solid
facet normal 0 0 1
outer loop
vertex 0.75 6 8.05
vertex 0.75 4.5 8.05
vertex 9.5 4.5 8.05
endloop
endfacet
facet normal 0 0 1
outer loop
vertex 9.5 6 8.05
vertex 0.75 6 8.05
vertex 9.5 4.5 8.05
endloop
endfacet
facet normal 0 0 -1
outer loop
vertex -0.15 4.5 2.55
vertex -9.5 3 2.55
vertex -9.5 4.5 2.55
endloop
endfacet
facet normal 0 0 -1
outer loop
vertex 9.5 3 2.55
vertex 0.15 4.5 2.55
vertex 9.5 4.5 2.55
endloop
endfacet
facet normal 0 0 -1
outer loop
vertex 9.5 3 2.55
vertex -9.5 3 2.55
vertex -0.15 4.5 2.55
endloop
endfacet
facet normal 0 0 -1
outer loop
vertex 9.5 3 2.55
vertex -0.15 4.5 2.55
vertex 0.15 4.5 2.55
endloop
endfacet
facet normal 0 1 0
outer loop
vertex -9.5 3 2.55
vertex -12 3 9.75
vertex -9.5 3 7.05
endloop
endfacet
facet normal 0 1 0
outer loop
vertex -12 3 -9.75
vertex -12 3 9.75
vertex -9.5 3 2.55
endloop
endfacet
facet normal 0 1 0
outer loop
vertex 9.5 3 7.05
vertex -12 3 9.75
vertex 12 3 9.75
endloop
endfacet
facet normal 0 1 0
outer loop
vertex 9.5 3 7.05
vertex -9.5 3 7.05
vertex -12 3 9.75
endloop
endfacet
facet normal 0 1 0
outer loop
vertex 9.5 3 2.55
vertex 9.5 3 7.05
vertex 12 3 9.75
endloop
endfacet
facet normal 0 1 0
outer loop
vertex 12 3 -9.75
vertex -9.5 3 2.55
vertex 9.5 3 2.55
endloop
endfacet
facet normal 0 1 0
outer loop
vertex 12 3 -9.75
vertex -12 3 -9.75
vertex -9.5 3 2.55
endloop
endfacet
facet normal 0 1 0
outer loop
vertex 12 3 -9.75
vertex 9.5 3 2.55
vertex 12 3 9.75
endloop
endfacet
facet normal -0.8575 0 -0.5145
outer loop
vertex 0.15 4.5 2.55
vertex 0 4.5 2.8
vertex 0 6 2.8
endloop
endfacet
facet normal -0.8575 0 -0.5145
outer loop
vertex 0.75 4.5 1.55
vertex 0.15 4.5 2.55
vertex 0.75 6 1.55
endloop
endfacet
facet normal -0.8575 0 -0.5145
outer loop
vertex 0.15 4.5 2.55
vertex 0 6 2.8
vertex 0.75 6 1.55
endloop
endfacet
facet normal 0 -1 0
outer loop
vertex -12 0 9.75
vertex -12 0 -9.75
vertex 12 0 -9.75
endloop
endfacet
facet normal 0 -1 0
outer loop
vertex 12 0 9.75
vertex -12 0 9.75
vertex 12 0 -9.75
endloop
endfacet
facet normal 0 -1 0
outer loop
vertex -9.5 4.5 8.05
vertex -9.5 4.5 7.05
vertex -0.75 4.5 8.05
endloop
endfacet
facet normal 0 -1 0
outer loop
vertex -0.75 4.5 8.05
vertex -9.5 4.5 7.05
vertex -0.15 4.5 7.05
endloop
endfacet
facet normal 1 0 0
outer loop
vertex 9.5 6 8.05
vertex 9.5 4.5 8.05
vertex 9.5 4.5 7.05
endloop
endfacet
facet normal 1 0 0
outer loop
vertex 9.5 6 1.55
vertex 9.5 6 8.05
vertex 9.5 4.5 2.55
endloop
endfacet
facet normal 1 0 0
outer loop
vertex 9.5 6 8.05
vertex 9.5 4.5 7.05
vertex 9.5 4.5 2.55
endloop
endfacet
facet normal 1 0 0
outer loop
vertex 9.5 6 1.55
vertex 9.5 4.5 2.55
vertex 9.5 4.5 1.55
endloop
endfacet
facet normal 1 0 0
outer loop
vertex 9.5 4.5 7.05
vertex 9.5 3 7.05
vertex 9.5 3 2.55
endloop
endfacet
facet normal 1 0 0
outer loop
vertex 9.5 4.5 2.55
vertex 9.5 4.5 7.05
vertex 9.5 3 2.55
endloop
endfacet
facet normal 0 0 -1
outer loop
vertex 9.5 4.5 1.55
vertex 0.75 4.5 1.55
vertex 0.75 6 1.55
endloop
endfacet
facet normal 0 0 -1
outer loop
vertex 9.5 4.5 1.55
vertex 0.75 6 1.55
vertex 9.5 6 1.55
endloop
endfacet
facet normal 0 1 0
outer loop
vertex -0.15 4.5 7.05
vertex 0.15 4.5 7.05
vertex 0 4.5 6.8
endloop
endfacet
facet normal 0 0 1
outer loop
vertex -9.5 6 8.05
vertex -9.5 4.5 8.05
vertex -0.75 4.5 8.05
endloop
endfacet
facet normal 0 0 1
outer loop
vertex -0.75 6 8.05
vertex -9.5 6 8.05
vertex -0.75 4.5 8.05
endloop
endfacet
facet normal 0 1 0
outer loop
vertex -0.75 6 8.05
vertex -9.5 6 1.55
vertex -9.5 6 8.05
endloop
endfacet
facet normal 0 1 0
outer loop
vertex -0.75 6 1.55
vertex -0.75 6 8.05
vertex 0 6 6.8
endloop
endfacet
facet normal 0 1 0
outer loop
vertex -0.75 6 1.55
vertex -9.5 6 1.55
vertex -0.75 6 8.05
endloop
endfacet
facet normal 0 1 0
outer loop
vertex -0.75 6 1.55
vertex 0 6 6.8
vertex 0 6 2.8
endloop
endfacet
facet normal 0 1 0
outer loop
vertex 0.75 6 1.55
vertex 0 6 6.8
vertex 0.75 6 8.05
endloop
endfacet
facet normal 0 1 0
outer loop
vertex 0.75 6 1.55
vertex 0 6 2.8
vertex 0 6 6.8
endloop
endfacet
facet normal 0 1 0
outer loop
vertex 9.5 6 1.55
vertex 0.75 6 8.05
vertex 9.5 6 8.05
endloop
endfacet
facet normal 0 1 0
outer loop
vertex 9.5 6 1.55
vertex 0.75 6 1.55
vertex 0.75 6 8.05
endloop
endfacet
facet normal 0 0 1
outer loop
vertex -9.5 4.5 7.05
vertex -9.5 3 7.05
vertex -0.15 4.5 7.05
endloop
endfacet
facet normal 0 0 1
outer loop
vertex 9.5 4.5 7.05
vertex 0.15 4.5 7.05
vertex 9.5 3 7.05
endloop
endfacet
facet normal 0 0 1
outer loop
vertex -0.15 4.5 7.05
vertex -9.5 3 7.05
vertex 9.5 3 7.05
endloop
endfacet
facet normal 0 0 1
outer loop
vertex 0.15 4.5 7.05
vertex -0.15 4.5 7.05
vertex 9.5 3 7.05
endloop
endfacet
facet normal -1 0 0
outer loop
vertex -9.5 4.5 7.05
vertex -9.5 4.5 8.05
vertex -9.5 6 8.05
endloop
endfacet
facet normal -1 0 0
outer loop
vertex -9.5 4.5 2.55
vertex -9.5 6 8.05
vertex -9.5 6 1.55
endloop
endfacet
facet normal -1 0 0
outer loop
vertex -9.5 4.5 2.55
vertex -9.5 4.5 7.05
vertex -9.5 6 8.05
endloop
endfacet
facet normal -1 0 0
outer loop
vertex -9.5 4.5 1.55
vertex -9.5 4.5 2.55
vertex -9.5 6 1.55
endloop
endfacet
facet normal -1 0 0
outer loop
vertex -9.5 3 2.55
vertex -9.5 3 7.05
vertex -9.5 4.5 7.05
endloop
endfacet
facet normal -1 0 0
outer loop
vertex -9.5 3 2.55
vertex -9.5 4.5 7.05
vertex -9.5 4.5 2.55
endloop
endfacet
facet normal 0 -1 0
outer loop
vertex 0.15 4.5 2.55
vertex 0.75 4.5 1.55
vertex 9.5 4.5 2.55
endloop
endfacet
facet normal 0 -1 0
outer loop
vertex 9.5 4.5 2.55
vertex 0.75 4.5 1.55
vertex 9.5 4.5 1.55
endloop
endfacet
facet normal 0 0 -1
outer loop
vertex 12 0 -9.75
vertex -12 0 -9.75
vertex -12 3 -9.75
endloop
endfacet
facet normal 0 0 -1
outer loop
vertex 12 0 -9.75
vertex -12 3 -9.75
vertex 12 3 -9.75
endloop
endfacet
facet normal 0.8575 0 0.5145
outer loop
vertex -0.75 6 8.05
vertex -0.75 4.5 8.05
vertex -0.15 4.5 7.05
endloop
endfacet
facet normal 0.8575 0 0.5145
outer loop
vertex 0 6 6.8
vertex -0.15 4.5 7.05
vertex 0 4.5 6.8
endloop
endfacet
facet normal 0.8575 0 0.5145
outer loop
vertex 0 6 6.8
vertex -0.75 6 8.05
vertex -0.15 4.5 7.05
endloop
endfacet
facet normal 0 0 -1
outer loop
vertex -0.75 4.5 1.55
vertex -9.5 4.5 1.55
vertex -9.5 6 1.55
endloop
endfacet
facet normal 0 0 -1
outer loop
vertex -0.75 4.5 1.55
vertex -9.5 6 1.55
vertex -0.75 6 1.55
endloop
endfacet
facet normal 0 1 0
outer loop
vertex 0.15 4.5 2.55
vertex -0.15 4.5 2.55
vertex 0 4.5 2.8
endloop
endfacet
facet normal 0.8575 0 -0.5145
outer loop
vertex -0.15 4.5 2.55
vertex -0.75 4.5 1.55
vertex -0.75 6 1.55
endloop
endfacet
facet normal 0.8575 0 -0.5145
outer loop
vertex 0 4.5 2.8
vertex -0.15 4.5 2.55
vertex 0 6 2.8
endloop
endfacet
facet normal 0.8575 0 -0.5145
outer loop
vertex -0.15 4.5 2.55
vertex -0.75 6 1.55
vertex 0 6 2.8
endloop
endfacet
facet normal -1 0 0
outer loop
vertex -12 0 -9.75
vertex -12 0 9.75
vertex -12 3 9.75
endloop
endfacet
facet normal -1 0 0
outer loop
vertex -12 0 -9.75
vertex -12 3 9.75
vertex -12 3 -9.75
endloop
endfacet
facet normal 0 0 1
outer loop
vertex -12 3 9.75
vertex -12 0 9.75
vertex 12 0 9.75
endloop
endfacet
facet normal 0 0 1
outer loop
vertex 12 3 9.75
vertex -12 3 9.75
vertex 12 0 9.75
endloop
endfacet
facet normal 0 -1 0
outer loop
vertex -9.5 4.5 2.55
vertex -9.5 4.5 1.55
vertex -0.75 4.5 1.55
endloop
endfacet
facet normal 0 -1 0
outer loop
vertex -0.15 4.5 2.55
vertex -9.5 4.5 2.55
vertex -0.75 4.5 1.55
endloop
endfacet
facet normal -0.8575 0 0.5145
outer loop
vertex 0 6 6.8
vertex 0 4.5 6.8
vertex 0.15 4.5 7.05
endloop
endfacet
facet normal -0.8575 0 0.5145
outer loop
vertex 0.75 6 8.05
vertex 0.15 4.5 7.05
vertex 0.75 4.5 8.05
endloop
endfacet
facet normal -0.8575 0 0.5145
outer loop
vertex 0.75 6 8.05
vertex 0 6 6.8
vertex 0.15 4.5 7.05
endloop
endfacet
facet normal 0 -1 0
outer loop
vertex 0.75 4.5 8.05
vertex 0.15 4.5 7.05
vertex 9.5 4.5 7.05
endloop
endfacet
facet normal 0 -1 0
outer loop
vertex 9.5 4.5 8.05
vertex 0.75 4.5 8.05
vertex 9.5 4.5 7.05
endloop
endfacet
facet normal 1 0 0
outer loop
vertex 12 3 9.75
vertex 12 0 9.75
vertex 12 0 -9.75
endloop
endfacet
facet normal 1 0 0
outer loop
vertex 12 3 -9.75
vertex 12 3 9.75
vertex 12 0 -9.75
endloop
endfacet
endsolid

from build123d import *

# Parameters (mm, degrees)
SKETCH1_W           = 24
SKETCH1_H           = 19.5
BOSS_EXTRUDE1_DEPTH = 3
SKETCH3_W           = 19
SKETCH3_H           = 4.5
BOSS_EXTRUDE2_DEPTH = 1.5
SKETCH4_W           = 19
SKETCH4_H           = 6.5
BOSS_EXTRUDE3_DEPTH = 1.5
CUT_EXTRUDE1_DEPTH  = 1.5


with BuildPart() as part:
    # Sketch1 → Boss-Extrude1 (new body)
    with BuildSketch(Plane(origin=(0, 0, 0), x_dir=(1, 0, 0), z_dir=(0, 1, 0))):
        Rectangle(SKETCH1_W, SKETCH1_H)
    extrude(amount=BOSS_EXTRUDE1_DEPTH)

    # Sketch3 → Boss-Extrude2 (add)
    with BuildSketch(Plane(origin=(0, 3, 0), x_dir=(1, 0, 0), z_dir=(0, 1, 0))):
        with Locations((0, -4.8)):
            Rectangle(SKETCH3_W, SKETCH3_H)
    extrude(amount=BOSS_EXTRUDE2_DEPTH)

    # Sketch4 → Boss-Extrude3 (add)
    with BuildSketch(Plane(origin=(0, 4.5, 0), x_dir=(1, 0, 0), z_dir=(0, 1, 0))):
        with Locations((0, -4.8)):
            Rectangle(SKETCH4_W, SKETCH4_H)
    extrude(amount=BOSS_EXTRUDE3_DEPTH)

    # Sketch5 → Cut-Extrude1 (cut)
    with BuildSketch(Plane(origin=(0, 6, 0), x_dir=(1, 0, 0), z_dir=(0, 1, 0))):
        Polygon((0, -2.8), (0.75, -1.55), (-0.75, -1.55), align=None)
        Polygon((0, -6.8), (0.75, -8.05), (-0.75, -8.05), align=None)
    extrude(amount=-CUT_EXTRUDE1_DEPTH, mode=Mode.SUBTRACT)


solid = part.part
